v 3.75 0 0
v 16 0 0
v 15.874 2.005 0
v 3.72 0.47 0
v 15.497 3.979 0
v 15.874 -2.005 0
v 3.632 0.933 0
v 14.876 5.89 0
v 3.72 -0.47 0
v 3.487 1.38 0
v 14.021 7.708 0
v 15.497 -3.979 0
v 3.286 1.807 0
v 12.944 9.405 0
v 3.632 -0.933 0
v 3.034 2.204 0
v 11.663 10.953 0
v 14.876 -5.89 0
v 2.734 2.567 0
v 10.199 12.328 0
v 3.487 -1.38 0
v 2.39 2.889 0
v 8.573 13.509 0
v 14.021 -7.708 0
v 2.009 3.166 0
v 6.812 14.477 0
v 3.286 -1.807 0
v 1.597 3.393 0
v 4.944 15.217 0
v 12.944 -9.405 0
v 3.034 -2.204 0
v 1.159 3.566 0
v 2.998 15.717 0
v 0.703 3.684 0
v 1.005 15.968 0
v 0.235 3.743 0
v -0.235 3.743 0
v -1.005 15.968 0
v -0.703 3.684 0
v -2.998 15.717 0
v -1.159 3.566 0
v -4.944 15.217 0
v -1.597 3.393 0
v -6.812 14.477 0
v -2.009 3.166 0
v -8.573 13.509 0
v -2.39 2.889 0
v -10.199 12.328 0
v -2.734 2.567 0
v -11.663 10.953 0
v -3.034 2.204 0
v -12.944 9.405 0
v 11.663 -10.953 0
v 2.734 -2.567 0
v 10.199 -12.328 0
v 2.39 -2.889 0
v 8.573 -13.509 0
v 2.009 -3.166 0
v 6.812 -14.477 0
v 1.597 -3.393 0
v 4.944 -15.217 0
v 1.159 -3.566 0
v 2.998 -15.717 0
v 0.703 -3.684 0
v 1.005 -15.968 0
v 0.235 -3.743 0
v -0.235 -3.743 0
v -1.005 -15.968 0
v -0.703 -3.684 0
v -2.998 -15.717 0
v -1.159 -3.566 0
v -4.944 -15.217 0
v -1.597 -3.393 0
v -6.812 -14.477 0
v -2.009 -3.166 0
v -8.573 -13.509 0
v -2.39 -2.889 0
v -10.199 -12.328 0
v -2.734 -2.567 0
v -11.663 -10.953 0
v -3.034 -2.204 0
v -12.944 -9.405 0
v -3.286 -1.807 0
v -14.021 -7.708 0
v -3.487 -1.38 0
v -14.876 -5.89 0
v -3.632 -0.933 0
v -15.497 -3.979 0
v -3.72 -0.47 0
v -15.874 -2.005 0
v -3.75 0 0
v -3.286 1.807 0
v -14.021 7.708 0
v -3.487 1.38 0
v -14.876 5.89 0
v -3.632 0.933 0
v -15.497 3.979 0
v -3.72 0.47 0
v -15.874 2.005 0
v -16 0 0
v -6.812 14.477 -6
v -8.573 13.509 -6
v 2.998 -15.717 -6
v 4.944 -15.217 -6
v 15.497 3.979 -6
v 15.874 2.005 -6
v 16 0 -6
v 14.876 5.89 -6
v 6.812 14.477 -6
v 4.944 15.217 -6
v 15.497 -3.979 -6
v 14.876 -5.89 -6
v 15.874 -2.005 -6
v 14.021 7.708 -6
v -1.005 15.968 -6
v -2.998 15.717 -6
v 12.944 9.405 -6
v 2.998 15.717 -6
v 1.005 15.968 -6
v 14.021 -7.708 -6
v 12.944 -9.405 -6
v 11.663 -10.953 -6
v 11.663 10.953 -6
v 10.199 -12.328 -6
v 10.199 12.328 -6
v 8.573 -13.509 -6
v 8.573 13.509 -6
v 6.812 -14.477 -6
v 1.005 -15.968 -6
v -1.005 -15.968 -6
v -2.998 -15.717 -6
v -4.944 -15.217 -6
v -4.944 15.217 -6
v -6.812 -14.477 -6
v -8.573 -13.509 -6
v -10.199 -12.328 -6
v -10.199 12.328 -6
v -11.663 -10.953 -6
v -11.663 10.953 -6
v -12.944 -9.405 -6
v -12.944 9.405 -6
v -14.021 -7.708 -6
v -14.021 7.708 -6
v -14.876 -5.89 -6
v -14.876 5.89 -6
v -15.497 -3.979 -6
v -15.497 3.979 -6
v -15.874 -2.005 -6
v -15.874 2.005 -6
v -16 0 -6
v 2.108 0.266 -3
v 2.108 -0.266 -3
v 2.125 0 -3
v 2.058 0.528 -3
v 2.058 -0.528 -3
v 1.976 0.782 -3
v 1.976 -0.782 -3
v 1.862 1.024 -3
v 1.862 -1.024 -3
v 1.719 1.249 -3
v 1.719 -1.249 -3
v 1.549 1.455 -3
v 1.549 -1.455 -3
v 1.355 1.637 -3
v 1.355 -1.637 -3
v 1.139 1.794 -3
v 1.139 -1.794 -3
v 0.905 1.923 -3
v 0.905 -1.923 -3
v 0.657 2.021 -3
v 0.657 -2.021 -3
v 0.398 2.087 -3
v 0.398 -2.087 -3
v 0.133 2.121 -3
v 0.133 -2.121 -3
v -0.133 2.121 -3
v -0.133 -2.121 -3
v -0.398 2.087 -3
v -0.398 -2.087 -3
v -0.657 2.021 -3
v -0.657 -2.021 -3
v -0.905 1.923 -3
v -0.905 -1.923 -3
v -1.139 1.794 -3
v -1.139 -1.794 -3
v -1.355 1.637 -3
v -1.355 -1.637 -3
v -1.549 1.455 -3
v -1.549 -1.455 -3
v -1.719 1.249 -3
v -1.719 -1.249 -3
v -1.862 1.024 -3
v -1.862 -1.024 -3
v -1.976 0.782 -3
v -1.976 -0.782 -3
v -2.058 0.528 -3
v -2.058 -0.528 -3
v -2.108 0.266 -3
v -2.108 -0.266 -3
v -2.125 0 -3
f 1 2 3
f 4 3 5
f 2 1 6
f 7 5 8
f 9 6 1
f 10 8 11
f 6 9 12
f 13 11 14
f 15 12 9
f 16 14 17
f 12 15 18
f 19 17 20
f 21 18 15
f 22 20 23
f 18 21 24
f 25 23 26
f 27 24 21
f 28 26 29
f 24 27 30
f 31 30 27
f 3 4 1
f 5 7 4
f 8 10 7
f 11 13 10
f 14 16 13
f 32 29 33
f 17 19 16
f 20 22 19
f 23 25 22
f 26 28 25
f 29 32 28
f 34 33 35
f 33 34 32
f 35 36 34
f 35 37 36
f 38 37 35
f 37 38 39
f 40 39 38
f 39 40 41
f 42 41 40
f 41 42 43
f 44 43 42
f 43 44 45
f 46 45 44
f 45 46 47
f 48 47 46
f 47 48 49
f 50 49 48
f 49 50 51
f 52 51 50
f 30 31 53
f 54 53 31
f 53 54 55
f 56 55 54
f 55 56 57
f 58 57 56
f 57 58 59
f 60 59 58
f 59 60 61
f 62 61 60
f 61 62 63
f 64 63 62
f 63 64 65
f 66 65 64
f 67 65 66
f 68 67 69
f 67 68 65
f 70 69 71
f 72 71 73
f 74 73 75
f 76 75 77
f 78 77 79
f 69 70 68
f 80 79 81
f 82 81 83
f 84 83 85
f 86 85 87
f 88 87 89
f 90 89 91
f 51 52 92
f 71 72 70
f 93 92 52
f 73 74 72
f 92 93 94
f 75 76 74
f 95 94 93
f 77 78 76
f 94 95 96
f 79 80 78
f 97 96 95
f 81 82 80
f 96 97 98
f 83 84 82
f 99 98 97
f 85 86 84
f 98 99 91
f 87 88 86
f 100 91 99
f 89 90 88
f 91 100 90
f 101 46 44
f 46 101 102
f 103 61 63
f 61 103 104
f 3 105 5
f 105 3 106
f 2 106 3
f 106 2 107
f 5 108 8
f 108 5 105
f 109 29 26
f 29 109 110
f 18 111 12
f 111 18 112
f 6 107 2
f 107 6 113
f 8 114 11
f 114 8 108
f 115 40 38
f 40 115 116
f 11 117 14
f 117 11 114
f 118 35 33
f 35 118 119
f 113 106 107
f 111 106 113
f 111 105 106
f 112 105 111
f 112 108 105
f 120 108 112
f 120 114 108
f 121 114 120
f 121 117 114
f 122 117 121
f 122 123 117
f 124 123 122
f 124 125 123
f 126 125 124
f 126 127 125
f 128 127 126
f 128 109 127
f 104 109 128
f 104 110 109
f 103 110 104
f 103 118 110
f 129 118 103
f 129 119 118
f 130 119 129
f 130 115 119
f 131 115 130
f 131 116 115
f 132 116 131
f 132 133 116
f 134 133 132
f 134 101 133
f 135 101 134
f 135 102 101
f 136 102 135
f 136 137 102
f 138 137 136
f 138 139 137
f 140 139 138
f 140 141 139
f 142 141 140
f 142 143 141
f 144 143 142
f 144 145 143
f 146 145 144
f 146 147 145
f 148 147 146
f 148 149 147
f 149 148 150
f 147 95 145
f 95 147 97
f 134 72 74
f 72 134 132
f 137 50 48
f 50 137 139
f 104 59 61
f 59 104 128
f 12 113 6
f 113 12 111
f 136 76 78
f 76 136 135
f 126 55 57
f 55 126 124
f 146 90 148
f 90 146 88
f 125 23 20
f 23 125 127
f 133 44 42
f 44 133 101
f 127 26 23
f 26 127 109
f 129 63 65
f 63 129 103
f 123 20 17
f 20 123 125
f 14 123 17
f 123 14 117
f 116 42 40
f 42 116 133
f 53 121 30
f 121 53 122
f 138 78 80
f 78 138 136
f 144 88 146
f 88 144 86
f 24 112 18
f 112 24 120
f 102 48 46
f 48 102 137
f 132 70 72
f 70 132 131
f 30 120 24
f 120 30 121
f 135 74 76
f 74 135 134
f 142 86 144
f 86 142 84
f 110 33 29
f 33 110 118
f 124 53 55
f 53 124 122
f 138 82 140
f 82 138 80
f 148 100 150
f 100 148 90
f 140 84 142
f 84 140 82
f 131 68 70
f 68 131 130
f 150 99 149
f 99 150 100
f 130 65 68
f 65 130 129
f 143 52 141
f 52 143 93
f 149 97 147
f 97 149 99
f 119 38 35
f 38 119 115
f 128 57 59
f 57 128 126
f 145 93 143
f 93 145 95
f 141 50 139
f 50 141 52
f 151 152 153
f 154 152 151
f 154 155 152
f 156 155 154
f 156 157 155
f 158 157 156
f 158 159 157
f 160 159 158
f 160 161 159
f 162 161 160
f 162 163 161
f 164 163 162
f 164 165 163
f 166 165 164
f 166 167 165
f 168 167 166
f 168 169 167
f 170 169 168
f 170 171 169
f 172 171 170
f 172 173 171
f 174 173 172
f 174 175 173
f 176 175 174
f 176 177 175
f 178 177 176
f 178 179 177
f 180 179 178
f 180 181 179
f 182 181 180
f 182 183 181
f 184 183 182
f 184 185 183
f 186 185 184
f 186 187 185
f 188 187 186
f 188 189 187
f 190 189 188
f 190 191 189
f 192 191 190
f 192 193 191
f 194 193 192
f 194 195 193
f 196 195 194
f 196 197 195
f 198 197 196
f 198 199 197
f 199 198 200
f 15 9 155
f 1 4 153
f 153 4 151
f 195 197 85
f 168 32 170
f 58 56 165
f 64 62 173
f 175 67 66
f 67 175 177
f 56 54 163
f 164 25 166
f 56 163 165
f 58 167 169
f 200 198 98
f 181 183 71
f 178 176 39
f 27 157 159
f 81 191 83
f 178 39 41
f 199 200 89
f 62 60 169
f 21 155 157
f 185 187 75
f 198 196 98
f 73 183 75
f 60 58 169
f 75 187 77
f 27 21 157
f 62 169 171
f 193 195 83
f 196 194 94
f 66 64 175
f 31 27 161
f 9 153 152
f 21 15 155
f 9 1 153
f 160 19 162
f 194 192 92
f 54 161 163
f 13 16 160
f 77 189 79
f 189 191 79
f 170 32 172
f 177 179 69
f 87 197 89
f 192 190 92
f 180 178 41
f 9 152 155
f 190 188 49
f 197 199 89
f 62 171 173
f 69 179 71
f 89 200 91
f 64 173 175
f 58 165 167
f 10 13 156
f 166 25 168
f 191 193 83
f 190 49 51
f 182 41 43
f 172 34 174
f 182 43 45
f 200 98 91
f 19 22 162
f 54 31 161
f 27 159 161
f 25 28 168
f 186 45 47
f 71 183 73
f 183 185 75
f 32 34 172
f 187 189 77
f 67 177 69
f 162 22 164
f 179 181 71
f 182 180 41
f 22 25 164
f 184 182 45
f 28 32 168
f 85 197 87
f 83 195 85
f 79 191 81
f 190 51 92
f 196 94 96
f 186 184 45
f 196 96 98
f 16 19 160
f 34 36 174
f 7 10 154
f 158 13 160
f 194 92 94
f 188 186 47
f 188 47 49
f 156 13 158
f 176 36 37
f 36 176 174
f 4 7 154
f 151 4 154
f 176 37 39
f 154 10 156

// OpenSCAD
$fn = 50;


difference() {
	union() {
		translate(v = [0, 0, -3.0000000000]) {
			cylinder(h = 3, r = 10.0000000000);
		}
		translate(v = [0, 0, -6.0000000000]) {
			cylinder(h = 6, r = 16.0000000000);
		}
	}
	union() {
		translate(v = [0, 0, 0]) {
			rotate(a = [0, 0, 0]) {
				difference() {
					union() {
						#translate(v = [0, 0, -3.0000000000]) {
							cylinder(h = 3, r = 2.0000000000);
						}
						#translate(v = [0, 0, -3]) {
							cylinder(h = 3, r1 = 2.1250000000, r2 = 3.7500000000);
						}
						#translate(v = [0, 0, -3.0000000000]) {
							cylinder(h = 3, r = 2.1250000000);
						}
						#translate(v = [0, 0, -3.0000000000]) {
							cylinder(h = 3, r = 2.0000000000);
						}
					}
					union();
				}
			}
		}
	}
}
